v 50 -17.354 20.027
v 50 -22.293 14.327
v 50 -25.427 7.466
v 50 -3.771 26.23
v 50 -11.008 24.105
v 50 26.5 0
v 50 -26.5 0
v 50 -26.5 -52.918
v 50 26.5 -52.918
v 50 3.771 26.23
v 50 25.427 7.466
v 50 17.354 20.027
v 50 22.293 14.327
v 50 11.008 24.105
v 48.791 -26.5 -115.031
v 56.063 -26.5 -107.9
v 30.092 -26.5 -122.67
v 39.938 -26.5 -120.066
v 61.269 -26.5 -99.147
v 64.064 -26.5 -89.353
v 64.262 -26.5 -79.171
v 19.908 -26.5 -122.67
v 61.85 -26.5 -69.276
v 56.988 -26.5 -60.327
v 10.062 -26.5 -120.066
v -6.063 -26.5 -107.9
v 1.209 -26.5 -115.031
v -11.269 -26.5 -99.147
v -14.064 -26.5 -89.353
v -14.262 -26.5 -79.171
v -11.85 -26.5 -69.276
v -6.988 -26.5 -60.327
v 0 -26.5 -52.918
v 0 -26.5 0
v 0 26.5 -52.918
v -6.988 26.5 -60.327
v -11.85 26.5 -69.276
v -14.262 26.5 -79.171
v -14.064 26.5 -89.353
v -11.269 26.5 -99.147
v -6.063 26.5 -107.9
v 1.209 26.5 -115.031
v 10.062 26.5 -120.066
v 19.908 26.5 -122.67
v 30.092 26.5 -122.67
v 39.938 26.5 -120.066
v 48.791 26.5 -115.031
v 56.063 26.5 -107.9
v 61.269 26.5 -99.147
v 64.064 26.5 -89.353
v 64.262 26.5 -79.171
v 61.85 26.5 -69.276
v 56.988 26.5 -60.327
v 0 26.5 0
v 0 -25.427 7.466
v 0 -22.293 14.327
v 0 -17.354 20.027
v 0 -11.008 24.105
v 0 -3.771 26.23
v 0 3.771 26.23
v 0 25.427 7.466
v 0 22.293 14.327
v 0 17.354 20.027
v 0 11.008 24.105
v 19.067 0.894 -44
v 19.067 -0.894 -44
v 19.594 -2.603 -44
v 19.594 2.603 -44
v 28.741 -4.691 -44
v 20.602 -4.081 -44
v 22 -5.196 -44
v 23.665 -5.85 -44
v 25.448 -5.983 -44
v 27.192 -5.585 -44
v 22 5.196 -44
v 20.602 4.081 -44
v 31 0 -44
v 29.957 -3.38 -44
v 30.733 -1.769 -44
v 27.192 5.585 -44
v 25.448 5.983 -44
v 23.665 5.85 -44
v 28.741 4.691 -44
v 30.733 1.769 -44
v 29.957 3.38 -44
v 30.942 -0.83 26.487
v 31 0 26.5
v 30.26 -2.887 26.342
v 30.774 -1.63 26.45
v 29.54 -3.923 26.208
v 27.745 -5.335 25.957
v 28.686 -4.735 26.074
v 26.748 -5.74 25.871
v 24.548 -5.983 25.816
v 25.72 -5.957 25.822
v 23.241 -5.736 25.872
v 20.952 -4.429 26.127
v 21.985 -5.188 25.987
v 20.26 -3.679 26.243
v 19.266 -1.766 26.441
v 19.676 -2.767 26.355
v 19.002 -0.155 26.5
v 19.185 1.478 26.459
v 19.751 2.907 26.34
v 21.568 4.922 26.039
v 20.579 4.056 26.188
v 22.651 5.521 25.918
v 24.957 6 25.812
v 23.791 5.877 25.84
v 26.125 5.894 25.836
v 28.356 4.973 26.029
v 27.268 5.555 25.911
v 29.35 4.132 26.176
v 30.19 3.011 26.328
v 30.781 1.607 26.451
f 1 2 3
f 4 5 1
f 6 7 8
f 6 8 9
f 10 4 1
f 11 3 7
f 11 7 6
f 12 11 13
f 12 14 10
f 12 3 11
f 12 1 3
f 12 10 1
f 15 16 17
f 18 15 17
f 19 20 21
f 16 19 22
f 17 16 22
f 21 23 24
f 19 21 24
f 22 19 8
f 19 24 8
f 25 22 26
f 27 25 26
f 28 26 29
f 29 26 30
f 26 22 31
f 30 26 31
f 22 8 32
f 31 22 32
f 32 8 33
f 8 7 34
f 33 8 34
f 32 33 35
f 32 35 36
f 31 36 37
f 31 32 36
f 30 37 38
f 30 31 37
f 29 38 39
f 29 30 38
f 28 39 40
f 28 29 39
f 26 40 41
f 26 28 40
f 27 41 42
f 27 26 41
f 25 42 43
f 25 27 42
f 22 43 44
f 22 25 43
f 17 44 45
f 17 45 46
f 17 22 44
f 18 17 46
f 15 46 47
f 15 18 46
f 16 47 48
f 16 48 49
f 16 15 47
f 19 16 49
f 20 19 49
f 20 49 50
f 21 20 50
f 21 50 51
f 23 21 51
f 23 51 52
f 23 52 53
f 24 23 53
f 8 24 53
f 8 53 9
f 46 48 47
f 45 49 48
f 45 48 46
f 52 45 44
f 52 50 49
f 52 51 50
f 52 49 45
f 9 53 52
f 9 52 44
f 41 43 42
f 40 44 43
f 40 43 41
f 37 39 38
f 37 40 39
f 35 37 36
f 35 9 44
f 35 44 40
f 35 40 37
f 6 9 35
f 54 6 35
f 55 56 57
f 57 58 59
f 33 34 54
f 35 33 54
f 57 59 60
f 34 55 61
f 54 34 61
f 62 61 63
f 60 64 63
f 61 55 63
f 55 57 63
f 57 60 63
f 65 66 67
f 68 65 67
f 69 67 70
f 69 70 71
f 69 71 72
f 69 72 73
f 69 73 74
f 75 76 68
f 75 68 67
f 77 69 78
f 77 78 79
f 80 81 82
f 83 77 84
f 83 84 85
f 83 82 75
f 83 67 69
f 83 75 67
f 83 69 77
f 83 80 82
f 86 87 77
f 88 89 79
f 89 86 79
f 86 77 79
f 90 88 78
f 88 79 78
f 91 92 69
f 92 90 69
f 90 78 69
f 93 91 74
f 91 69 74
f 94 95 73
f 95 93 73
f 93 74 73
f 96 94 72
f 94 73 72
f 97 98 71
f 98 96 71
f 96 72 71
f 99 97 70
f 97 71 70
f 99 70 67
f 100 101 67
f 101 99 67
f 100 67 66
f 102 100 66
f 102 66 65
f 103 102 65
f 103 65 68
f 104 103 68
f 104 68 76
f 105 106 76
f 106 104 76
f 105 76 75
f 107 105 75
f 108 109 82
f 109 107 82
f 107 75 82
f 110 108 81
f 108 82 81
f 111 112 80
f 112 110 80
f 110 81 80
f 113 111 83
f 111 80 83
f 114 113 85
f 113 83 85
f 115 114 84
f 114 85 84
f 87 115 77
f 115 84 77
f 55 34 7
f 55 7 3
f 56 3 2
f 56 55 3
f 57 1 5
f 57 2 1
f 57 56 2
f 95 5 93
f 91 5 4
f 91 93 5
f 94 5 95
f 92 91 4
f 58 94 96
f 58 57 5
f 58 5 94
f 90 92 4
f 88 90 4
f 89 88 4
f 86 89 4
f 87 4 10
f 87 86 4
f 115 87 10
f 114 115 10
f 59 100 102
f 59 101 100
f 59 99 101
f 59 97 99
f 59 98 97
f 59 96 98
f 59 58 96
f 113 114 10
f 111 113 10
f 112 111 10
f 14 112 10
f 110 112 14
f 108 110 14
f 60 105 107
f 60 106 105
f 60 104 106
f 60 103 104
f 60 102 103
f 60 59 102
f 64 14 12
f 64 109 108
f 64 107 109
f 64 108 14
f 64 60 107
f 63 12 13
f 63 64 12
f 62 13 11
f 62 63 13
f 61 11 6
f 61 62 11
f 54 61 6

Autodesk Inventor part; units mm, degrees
ref_plane "YZ Plane" through (0, 0, 0) normal (1, 0, 0) x (0, 1, 0)
ref_plane "XZ Plane" through (0, 0, 0) normal (0, 1, 0) x (-1, 0, 0)
sketch "Sketch1" plane through (0, 0, 0) normal (0, 1, 0) x (-1, 0, 0)
  line L0 (0, 0) -> (-50, 0)
  line L1 (-50, 0) -> (-50, -83.5)
  line L2 (-50, -83.5) -> (0, -83.5)
  line L3 (0, -83.5) -> (0, 0)
  circle A0 centre (-25, -83.5) radius 39.5
  point P0 (-50, -52.9181)
  point P1 (0, -52.9181)
  dimension "d0" = 50
  dimension "d1" = 79
  dimension "d14" = 83.5
extrude "Extrusion1" add sketch "Sketch1" along normal mid plane 53
sketch "Sketch2" plane through (0, 0, 0) normal (1, 0, 0) x (0, 1, 0)
  line L0 (26.5, 0) -> (-26.5, 0) projected
  circle A0 centre (0, 0) radius 26.5
extrude "Extrusion2" add sketch "Sketch2" along normal up to surface (50 mm away) contours L0 A0 picked at (8.0782, 6.219)
ref_plane "Work Plane1" through (25, 0, -44) normal (0, 0, 1) x (1, 0, 0)
sketch "Sketch3" plane through (25, 0, -44) normal (0, 0, 1) x (1, 0, 0)
  circle A0 centre (0, 0) radius 6
  line L0 (-25, 0) -> (27.9863, 0) construction
  line L1 (39.5, 26.5) -> (-39.5, 26.5) construction
  line L2 (0, 26.5) -> (0, -26.5) construction
  point P0 (25, 26.5)
  point P1 (-25, 26.5)
  dimension "d15" = 12
extrude "Extrusion3" cut sketch "Sketch3" along normal through all
properties part number "thigh_inventor"
